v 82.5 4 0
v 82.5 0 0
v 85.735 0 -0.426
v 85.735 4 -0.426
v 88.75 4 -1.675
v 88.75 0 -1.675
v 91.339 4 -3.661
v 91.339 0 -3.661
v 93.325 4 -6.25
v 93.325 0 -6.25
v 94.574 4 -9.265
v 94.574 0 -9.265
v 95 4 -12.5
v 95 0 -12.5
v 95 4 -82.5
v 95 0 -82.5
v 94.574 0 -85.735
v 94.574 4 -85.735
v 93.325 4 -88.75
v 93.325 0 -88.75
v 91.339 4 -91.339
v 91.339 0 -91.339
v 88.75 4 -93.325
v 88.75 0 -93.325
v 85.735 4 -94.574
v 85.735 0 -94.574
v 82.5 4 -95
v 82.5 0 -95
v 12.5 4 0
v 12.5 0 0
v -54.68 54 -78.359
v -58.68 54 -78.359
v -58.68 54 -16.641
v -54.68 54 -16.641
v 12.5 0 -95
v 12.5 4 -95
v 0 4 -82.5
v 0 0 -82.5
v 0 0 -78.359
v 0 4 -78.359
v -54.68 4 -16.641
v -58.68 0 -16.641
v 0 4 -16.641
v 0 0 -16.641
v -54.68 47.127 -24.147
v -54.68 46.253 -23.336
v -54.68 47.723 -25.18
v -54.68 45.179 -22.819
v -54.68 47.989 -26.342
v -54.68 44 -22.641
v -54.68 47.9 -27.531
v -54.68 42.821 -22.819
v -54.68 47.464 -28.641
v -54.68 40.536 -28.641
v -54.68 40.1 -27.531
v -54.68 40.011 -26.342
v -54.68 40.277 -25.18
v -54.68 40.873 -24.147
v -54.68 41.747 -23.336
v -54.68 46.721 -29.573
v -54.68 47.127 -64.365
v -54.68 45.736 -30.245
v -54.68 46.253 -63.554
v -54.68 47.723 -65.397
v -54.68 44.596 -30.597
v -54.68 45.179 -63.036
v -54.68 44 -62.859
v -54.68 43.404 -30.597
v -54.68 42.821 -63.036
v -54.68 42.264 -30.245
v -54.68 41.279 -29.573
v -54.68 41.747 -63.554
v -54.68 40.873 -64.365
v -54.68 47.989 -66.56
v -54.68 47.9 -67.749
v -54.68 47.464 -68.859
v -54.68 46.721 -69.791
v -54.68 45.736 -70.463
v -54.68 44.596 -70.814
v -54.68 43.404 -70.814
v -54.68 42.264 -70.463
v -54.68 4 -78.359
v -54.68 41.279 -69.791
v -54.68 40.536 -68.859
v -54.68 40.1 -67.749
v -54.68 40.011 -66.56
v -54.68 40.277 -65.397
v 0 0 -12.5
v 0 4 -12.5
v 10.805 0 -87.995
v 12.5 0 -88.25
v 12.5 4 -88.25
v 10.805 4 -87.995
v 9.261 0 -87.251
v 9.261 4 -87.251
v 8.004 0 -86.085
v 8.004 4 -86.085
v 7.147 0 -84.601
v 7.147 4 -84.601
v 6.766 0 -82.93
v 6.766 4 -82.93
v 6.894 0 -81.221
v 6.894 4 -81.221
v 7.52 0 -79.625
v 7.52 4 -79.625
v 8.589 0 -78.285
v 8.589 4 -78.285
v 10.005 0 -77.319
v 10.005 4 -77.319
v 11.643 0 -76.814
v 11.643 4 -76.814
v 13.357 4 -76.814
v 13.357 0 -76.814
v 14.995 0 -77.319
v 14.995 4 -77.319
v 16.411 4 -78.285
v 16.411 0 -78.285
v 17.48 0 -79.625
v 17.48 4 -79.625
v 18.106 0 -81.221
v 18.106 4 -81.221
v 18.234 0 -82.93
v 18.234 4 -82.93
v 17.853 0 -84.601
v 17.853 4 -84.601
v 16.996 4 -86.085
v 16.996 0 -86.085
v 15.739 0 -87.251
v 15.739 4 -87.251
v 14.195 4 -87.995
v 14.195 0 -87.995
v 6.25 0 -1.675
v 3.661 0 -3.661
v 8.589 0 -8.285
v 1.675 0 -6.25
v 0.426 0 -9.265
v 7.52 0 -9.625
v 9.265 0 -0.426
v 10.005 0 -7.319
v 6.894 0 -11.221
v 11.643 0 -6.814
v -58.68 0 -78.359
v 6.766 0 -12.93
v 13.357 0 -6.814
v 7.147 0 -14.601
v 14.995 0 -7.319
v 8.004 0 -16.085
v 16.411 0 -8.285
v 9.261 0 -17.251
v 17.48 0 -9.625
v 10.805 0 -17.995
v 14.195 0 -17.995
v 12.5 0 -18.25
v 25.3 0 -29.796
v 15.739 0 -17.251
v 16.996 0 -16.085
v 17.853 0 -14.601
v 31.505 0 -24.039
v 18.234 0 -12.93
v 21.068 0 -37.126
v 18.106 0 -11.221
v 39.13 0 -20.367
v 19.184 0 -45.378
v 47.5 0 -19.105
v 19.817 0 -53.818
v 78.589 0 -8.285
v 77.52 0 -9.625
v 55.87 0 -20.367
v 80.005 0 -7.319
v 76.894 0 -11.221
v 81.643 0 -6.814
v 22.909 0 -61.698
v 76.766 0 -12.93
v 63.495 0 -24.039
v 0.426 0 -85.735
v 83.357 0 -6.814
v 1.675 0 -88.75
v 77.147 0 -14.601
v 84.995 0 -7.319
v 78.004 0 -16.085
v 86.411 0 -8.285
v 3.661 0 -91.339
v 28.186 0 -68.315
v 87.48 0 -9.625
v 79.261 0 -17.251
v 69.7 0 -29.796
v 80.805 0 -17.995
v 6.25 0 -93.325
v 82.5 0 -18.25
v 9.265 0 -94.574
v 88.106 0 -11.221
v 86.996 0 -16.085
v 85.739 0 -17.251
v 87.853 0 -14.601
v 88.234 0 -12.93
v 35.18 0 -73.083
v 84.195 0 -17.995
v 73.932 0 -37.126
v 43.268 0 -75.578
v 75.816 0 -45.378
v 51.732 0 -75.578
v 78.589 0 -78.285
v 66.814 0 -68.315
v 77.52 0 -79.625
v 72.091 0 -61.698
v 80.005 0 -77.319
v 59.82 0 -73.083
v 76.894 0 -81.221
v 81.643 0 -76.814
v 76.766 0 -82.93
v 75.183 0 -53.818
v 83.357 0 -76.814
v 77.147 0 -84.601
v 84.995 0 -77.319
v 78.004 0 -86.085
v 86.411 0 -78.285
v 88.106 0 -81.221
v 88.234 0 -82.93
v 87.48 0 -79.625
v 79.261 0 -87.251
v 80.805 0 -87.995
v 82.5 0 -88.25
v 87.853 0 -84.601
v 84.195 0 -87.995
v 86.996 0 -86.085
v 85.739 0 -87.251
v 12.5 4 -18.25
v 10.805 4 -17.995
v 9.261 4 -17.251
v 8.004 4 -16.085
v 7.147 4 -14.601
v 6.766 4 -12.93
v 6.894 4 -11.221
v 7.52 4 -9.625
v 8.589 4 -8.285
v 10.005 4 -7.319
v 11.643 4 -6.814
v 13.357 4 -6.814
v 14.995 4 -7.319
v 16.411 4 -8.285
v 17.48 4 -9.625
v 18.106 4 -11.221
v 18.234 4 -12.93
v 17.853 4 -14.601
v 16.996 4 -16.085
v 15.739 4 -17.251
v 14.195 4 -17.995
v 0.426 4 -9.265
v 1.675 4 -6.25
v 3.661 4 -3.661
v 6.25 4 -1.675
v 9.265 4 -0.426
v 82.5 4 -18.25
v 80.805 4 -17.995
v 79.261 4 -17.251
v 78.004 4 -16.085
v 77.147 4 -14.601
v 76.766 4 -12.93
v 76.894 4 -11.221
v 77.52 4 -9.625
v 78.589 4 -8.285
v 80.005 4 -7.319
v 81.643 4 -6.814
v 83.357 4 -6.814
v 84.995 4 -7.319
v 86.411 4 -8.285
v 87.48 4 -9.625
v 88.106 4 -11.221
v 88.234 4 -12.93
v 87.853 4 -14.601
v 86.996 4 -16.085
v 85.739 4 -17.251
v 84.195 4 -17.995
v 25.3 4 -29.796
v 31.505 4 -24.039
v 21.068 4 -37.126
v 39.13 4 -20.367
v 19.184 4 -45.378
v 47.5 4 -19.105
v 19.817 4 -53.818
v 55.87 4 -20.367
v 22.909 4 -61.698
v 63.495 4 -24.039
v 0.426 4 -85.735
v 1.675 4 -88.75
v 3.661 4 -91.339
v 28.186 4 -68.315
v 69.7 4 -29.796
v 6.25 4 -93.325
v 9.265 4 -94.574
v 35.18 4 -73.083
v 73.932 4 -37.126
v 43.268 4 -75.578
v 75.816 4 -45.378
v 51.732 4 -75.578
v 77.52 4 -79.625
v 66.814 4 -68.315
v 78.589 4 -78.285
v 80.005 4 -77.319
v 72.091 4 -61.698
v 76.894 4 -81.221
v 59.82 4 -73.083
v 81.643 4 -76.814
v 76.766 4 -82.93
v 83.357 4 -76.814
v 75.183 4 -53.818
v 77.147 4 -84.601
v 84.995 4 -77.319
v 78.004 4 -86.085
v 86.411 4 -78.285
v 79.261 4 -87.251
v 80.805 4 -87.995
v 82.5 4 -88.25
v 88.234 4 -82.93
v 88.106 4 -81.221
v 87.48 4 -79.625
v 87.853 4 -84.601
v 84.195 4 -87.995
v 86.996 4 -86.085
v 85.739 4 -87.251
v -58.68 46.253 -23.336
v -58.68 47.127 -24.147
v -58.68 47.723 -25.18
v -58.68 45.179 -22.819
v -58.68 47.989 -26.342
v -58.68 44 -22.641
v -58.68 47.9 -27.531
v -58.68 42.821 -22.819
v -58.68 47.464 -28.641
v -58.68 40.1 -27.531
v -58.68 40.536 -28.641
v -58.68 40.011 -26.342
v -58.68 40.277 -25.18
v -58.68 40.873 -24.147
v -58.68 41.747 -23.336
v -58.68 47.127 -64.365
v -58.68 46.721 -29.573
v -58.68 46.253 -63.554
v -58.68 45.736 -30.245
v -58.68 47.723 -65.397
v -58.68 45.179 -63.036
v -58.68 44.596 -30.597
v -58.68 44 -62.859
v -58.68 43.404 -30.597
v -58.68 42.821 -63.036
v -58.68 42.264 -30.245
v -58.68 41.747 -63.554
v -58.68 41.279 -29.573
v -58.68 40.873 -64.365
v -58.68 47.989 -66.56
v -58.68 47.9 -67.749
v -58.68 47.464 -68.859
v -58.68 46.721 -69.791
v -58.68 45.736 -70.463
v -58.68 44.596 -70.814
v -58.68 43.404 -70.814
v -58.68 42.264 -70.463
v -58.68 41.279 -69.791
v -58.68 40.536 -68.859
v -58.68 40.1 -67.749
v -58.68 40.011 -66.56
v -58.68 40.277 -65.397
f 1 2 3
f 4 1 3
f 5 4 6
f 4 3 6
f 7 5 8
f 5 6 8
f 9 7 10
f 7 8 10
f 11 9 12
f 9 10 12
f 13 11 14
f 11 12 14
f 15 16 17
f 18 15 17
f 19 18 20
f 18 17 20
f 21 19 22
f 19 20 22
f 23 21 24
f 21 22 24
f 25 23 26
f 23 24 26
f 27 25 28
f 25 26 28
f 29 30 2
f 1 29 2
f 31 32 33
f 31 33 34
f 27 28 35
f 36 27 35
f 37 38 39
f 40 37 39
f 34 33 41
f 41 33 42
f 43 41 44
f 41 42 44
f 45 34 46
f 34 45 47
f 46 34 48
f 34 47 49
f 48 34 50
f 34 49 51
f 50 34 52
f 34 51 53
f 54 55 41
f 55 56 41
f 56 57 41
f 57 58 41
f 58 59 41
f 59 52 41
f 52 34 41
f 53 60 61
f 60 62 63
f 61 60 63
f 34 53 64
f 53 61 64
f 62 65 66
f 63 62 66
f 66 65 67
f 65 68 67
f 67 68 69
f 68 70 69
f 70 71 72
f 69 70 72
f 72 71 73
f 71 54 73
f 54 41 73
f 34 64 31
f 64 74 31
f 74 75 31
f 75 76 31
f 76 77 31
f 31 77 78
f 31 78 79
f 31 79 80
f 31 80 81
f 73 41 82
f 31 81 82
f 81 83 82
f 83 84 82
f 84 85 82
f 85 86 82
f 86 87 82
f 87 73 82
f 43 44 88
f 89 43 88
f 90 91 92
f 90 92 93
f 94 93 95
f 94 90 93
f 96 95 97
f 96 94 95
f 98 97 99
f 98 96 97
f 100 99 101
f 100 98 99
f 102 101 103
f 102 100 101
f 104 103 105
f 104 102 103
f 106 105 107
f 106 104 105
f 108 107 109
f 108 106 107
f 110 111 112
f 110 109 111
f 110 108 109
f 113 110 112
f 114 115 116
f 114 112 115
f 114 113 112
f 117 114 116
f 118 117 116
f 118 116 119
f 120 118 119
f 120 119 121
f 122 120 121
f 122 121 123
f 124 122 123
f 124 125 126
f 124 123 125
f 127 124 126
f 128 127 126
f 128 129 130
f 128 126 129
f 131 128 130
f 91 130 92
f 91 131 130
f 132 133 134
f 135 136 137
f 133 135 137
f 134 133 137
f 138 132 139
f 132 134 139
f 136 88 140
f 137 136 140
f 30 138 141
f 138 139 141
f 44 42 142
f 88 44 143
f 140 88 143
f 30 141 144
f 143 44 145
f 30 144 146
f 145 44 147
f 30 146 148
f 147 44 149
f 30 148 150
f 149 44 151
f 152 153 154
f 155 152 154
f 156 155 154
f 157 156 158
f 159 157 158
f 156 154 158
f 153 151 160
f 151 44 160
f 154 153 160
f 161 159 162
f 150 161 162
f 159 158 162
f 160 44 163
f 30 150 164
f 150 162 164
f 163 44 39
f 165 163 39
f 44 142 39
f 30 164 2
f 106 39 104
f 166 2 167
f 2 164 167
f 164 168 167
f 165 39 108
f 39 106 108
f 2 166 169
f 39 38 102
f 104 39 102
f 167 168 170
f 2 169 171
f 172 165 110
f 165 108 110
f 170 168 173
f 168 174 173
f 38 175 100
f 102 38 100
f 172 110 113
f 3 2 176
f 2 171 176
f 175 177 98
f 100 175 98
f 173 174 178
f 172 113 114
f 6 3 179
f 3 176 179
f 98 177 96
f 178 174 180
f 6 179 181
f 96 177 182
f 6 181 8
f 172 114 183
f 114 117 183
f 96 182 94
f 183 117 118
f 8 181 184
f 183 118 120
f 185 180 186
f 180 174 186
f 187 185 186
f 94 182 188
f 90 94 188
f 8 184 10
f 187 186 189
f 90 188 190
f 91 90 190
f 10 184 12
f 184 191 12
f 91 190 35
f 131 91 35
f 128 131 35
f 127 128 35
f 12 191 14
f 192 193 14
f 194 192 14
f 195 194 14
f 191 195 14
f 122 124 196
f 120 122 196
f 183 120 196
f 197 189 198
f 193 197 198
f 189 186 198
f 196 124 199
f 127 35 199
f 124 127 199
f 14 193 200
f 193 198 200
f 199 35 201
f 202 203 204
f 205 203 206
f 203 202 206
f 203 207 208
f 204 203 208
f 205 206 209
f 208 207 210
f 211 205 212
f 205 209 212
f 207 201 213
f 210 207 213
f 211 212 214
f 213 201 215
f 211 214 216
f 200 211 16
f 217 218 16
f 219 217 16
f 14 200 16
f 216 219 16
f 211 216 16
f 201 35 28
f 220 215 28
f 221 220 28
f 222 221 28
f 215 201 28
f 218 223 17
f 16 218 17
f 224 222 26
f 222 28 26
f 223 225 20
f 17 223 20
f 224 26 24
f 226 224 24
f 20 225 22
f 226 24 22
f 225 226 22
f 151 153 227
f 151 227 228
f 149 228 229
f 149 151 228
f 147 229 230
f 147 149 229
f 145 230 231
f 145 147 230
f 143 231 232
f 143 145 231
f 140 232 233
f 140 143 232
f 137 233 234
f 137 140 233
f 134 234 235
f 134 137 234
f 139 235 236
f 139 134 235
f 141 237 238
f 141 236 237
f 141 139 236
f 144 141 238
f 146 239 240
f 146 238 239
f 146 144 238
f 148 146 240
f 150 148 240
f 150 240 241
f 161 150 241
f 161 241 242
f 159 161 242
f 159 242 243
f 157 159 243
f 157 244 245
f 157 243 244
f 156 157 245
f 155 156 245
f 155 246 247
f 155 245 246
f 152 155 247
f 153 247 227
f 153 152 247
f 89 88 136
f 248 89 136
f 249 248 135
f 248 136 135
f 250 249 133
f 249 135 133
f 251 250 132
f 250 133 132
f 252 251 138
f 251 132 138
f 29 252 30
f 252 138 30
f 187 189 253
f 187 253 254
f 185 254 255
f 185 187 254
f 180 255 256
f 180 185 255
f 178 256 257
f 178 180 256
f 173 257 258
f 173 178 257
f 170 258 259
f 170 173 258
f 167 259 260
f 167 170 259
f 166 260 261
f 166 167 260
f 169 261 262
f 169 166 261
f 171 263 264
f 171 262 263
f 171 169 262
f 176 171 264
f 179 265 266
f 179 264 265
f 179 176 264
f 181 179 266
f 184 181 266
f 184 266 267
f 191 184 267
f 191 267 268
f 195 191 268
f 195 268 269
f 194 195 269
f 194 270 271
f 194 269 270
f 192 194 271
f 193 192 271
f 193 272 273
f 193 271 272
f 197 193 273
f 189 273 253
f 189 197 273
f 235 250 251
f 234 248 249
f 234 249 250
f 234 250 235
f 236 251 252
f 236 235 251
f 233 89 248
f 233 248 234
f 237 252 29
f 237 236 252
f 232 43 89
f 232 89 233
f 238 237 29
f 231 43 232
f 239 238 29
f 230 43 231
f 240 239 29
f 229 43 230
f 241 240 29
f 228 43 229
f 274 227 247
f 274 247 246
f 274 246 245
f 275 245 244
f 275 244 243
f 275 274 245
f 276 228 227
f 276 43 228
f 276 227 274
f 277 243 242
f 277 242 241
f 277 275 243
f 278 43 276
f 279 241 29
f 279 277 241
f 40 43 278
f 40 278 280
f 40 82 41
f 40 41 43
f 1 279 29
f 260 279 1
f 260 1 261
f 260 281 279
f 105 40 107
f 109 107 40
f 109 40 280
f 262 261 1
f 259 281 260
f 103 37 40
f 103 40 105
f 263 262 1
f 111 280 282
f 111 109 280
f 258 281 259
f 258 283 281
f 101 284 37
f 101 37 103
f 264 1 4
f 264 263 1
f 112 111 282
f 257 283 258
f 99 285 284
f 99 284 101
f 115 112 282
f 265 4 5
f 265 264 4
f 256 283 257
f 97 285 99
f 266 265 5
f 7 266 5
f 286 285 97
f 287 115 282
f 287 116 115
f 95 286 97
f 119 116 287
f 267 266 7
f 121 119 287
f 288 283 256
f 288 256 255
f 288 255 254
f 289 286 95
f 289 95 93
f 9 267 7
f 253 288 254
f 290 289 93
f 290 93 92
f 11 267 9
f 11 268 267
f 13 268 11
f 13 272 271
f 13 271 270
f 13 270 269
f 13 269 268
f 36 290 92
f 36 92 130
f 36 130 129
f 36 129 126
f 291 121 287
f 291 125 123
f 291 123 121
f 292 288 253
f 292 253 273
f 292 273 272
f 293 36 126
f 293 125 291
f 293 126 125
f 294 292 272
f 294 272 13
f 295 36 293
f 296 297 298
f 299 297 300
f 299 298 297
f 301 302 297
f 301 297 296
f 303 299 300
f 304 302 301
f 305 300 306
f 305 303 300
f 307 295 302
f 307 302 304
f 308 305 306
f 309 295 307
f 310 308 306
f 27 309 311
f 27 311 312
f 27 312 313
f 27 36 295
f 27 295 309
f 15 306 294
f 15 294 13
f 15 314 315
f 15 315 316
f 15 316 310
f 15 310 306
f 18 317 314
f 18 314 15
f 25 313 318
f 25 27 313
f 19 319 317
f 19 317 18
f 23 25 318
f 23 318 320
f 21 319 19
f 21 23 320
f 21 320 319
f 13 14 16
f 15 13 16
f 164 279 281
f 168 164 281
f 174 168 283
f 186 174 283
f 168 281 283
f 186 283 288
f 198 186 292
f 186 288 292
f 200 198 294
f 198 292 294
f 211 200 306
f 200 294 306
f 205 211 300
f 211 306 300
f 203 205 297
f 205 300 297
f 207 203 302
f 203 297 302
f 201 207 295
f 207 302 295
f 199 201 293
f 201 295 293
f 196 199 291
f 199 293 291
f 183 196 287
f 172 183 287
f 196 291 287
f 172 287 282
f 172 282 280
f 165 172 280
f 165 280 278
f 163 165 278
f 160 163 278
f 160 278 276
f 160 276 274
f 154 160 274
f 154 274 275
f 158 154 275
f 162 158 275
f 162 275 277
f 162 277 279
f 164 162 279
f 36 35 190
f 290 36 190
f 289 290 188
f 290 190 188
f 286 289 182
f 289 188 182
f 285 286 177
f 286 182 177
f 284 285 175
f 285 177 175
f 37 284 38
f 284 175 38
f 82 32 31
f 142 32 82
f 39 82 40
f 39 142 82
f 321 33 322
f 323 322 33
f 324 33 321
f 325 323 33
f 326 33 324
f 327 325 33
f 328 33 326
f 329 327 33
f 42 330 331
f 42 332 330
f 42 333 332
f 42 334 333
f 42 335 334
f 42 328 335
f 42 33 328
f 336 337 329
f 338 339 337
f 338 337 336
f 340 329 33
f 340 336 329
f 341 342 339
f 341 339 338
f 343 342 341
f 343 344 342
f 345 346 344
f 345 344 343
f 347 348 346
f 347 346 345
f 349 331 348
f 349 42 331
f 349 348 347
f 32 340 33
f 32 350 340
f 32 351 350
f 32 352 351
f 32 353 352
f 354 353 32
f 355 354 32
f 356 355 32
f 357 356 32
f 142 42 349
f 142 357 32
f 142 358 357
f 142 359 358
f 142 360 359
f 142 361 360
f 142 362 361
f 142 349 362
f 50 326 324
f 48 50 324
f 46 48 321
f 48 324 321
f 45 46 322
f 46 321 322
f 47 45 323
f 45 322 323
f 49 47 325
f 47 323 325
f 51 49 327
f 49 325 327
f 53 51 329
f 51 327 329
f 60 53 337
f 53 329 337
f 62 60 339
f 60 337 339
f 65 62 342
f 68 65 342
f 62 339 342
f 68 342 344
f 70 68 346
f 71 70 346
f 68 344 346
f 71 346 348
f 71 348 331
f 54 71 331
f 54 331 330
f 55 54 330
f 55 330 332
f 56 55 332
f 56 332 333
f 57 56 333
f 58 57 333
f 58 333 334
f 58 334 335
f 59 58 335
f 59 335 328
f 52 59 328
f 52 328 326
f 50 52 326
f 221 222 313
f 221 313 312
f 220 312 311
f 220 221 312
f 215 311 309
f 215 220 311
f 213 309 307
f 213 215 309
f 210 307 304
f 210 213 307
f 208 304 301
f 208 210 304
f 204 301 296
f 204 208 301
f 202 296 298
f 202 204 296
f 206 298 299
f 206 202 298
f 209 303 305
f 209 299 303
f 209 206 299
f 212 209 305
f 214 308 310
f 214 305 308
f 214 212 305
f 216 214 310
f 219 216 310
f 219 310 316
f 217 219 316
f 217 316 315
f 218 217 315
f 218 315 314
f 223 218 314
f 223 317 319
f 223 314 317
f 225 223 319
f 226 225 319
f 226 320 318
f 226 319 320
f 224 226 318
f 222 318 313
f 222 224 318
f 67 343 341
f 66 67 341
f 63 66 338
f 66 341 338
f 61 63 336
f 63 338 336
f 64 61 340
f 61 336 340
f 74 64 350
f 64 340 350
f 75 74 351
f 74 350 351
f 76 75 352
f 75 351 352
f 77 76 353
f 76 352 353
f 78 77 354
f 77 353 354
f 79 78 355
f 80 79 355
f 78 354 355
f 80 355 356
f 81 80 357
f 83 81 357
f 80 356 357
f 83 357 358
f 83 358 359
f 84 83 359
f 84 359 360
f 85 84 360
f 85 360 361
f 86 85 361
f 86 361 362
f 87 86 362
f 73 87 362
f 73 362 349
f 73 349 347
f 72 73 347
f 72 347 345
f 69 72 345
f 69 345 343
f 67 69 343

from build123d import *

# Parameters (mm, degrees)
BOSS_EXTRUDE1_DEPTH     = 4
CUT_EXTRUDE1_DEPTH      = 10
CUT_EXTRUDE1_DEPTH_BACK = 10
SKETCH2_R               = 5.75
BOSS_EXTRUDE5_DEPTH     = 58.68
SKETCH12_W              = 4
SKETCH12_H              = 61.717483032
BOSS_EXTRUDE8_DEPTH     = 50
SKETCH13_R              = 4
CUT_EXTRUDE5_DEPTH      = 20
SKETCH14_R              = 28.395
CUT_EXTRUDE6_DEPTH      = 10


with BuildPart() as part:
    # Sketch1 → Boss-Extrude1 (new body)
    with BuildSketch(Plane(origin=(0, 0, 0), x_dir=(1, 0, 0), z_dir=(0, 1, 0))):
        with BuildLine():
            Line((12.5, 0), (82.5, 0))
            ThreePointArc((82.5, 0), (91.338834765, 3.661165235), (95, 12.5))
            Line((95, 12.5), (95, 82.5))
            ThreePointArc((95, 82.5), (91.338834765, 91.338834765), (82.5, 95))
            Line((82.5, 95), (12.5, 95))
            ThreePointArc((12.5, 95), (3.661165235, 91.338834765), (0, 82.5))
            Line((0, 82.5), (0, 12.5))
            ThreePointArc((0, 12.5), (3.661165235, 3.661165235), (12.5, 0))
        make_face()
    extrude(amount=BOSS_EXTRUDE1_DEPTH)

    # Sketch2 → Cut-Extrude1 (cut, two sides: drawn at the far end of the back side and taken through both)
    with BuildSketch(Plane(origin=(0, 4, 0), x_dir=(1, 0, 0), z_dir=(0, 1, 0)).offset(-CUT_EXTRUDE1_DEPTH_BACK)):
        with Locations(Location((12.5, 82.5, 0), (0, 0, 90))):
            Circle(SKETCH2_R)
        with Locations(Location((82.5, 82.5, 0), (0, 0, 90))):
            Circle(SKETCH2_R)
        with Locations(Location((12.5, 12.5, 0), (0, 0, 90))):
            Circle(SKETCH2_R)
        with Locations(Location((82.5, 12.5, 0), (0, 0, 90))):
            Circle(SKETCH2_R)
    extrude(amount=CUT_EXTRUDE1_DEPTH + CUT_EXTRUDE1_DEPTH_BACK, mode=Mode.SUBTRACT)

    # Sketch8 → Boss-Extrude5 (add)
    with BuildSketch(Plane.ZY):
        Polygon((-17.641258484, 4), (-16.641258484, 4), (-16.641258484, 0), (-78.358741516, 0), (-78.358741516, 4), (-77.358741516, 4), align=None)
    extrude(amount=BOSS_EXTRUDE5_DEPTH)

    # Sketch12 → Boss-Extrude8 (add)
    with BuildSketch(Plane(origin=(0, 4, 0), x_dir=(1, 0, 0), z_dir=(0, 1, 0))):
        with Locations((-56.68, 47.5)):
            Rectangle(SKETCH12_W, SKETCH12_H)
    extrude(amount=BOSS_EXTRUDE8_DEPTH)

    # Sketch13 → Cut-Extrude5 (cut)
    with BuildSketch(Plane.ZY.offset(58.68)):
        with Locations((-66.858741516, 44)):
            Circle(SKETCH13_R)
        with Locations((-26.641258484, 44)):
            Circle(SKETCH13_R)
    extrude(amount=-CUT_EXTRUDE5_DEPTH, mode=Mode.SUBTRACT)

    # Sketch14 → Cut-Extrude6 (cut)
    with BuildSketch(Plane(origin=(0, 4, 0), x_dir=(1, 0, 0), z_dir=(0, 1, 0))):
        with Locations(Location((47.5, 47.5, 0), (0, 0, 270))):
            Circle(SKETCH14_R)
    extrude(amount=-CUT_EXTRUDE6_DEPTH, mode=Mode.SUBTRACT)


solid = part.part
